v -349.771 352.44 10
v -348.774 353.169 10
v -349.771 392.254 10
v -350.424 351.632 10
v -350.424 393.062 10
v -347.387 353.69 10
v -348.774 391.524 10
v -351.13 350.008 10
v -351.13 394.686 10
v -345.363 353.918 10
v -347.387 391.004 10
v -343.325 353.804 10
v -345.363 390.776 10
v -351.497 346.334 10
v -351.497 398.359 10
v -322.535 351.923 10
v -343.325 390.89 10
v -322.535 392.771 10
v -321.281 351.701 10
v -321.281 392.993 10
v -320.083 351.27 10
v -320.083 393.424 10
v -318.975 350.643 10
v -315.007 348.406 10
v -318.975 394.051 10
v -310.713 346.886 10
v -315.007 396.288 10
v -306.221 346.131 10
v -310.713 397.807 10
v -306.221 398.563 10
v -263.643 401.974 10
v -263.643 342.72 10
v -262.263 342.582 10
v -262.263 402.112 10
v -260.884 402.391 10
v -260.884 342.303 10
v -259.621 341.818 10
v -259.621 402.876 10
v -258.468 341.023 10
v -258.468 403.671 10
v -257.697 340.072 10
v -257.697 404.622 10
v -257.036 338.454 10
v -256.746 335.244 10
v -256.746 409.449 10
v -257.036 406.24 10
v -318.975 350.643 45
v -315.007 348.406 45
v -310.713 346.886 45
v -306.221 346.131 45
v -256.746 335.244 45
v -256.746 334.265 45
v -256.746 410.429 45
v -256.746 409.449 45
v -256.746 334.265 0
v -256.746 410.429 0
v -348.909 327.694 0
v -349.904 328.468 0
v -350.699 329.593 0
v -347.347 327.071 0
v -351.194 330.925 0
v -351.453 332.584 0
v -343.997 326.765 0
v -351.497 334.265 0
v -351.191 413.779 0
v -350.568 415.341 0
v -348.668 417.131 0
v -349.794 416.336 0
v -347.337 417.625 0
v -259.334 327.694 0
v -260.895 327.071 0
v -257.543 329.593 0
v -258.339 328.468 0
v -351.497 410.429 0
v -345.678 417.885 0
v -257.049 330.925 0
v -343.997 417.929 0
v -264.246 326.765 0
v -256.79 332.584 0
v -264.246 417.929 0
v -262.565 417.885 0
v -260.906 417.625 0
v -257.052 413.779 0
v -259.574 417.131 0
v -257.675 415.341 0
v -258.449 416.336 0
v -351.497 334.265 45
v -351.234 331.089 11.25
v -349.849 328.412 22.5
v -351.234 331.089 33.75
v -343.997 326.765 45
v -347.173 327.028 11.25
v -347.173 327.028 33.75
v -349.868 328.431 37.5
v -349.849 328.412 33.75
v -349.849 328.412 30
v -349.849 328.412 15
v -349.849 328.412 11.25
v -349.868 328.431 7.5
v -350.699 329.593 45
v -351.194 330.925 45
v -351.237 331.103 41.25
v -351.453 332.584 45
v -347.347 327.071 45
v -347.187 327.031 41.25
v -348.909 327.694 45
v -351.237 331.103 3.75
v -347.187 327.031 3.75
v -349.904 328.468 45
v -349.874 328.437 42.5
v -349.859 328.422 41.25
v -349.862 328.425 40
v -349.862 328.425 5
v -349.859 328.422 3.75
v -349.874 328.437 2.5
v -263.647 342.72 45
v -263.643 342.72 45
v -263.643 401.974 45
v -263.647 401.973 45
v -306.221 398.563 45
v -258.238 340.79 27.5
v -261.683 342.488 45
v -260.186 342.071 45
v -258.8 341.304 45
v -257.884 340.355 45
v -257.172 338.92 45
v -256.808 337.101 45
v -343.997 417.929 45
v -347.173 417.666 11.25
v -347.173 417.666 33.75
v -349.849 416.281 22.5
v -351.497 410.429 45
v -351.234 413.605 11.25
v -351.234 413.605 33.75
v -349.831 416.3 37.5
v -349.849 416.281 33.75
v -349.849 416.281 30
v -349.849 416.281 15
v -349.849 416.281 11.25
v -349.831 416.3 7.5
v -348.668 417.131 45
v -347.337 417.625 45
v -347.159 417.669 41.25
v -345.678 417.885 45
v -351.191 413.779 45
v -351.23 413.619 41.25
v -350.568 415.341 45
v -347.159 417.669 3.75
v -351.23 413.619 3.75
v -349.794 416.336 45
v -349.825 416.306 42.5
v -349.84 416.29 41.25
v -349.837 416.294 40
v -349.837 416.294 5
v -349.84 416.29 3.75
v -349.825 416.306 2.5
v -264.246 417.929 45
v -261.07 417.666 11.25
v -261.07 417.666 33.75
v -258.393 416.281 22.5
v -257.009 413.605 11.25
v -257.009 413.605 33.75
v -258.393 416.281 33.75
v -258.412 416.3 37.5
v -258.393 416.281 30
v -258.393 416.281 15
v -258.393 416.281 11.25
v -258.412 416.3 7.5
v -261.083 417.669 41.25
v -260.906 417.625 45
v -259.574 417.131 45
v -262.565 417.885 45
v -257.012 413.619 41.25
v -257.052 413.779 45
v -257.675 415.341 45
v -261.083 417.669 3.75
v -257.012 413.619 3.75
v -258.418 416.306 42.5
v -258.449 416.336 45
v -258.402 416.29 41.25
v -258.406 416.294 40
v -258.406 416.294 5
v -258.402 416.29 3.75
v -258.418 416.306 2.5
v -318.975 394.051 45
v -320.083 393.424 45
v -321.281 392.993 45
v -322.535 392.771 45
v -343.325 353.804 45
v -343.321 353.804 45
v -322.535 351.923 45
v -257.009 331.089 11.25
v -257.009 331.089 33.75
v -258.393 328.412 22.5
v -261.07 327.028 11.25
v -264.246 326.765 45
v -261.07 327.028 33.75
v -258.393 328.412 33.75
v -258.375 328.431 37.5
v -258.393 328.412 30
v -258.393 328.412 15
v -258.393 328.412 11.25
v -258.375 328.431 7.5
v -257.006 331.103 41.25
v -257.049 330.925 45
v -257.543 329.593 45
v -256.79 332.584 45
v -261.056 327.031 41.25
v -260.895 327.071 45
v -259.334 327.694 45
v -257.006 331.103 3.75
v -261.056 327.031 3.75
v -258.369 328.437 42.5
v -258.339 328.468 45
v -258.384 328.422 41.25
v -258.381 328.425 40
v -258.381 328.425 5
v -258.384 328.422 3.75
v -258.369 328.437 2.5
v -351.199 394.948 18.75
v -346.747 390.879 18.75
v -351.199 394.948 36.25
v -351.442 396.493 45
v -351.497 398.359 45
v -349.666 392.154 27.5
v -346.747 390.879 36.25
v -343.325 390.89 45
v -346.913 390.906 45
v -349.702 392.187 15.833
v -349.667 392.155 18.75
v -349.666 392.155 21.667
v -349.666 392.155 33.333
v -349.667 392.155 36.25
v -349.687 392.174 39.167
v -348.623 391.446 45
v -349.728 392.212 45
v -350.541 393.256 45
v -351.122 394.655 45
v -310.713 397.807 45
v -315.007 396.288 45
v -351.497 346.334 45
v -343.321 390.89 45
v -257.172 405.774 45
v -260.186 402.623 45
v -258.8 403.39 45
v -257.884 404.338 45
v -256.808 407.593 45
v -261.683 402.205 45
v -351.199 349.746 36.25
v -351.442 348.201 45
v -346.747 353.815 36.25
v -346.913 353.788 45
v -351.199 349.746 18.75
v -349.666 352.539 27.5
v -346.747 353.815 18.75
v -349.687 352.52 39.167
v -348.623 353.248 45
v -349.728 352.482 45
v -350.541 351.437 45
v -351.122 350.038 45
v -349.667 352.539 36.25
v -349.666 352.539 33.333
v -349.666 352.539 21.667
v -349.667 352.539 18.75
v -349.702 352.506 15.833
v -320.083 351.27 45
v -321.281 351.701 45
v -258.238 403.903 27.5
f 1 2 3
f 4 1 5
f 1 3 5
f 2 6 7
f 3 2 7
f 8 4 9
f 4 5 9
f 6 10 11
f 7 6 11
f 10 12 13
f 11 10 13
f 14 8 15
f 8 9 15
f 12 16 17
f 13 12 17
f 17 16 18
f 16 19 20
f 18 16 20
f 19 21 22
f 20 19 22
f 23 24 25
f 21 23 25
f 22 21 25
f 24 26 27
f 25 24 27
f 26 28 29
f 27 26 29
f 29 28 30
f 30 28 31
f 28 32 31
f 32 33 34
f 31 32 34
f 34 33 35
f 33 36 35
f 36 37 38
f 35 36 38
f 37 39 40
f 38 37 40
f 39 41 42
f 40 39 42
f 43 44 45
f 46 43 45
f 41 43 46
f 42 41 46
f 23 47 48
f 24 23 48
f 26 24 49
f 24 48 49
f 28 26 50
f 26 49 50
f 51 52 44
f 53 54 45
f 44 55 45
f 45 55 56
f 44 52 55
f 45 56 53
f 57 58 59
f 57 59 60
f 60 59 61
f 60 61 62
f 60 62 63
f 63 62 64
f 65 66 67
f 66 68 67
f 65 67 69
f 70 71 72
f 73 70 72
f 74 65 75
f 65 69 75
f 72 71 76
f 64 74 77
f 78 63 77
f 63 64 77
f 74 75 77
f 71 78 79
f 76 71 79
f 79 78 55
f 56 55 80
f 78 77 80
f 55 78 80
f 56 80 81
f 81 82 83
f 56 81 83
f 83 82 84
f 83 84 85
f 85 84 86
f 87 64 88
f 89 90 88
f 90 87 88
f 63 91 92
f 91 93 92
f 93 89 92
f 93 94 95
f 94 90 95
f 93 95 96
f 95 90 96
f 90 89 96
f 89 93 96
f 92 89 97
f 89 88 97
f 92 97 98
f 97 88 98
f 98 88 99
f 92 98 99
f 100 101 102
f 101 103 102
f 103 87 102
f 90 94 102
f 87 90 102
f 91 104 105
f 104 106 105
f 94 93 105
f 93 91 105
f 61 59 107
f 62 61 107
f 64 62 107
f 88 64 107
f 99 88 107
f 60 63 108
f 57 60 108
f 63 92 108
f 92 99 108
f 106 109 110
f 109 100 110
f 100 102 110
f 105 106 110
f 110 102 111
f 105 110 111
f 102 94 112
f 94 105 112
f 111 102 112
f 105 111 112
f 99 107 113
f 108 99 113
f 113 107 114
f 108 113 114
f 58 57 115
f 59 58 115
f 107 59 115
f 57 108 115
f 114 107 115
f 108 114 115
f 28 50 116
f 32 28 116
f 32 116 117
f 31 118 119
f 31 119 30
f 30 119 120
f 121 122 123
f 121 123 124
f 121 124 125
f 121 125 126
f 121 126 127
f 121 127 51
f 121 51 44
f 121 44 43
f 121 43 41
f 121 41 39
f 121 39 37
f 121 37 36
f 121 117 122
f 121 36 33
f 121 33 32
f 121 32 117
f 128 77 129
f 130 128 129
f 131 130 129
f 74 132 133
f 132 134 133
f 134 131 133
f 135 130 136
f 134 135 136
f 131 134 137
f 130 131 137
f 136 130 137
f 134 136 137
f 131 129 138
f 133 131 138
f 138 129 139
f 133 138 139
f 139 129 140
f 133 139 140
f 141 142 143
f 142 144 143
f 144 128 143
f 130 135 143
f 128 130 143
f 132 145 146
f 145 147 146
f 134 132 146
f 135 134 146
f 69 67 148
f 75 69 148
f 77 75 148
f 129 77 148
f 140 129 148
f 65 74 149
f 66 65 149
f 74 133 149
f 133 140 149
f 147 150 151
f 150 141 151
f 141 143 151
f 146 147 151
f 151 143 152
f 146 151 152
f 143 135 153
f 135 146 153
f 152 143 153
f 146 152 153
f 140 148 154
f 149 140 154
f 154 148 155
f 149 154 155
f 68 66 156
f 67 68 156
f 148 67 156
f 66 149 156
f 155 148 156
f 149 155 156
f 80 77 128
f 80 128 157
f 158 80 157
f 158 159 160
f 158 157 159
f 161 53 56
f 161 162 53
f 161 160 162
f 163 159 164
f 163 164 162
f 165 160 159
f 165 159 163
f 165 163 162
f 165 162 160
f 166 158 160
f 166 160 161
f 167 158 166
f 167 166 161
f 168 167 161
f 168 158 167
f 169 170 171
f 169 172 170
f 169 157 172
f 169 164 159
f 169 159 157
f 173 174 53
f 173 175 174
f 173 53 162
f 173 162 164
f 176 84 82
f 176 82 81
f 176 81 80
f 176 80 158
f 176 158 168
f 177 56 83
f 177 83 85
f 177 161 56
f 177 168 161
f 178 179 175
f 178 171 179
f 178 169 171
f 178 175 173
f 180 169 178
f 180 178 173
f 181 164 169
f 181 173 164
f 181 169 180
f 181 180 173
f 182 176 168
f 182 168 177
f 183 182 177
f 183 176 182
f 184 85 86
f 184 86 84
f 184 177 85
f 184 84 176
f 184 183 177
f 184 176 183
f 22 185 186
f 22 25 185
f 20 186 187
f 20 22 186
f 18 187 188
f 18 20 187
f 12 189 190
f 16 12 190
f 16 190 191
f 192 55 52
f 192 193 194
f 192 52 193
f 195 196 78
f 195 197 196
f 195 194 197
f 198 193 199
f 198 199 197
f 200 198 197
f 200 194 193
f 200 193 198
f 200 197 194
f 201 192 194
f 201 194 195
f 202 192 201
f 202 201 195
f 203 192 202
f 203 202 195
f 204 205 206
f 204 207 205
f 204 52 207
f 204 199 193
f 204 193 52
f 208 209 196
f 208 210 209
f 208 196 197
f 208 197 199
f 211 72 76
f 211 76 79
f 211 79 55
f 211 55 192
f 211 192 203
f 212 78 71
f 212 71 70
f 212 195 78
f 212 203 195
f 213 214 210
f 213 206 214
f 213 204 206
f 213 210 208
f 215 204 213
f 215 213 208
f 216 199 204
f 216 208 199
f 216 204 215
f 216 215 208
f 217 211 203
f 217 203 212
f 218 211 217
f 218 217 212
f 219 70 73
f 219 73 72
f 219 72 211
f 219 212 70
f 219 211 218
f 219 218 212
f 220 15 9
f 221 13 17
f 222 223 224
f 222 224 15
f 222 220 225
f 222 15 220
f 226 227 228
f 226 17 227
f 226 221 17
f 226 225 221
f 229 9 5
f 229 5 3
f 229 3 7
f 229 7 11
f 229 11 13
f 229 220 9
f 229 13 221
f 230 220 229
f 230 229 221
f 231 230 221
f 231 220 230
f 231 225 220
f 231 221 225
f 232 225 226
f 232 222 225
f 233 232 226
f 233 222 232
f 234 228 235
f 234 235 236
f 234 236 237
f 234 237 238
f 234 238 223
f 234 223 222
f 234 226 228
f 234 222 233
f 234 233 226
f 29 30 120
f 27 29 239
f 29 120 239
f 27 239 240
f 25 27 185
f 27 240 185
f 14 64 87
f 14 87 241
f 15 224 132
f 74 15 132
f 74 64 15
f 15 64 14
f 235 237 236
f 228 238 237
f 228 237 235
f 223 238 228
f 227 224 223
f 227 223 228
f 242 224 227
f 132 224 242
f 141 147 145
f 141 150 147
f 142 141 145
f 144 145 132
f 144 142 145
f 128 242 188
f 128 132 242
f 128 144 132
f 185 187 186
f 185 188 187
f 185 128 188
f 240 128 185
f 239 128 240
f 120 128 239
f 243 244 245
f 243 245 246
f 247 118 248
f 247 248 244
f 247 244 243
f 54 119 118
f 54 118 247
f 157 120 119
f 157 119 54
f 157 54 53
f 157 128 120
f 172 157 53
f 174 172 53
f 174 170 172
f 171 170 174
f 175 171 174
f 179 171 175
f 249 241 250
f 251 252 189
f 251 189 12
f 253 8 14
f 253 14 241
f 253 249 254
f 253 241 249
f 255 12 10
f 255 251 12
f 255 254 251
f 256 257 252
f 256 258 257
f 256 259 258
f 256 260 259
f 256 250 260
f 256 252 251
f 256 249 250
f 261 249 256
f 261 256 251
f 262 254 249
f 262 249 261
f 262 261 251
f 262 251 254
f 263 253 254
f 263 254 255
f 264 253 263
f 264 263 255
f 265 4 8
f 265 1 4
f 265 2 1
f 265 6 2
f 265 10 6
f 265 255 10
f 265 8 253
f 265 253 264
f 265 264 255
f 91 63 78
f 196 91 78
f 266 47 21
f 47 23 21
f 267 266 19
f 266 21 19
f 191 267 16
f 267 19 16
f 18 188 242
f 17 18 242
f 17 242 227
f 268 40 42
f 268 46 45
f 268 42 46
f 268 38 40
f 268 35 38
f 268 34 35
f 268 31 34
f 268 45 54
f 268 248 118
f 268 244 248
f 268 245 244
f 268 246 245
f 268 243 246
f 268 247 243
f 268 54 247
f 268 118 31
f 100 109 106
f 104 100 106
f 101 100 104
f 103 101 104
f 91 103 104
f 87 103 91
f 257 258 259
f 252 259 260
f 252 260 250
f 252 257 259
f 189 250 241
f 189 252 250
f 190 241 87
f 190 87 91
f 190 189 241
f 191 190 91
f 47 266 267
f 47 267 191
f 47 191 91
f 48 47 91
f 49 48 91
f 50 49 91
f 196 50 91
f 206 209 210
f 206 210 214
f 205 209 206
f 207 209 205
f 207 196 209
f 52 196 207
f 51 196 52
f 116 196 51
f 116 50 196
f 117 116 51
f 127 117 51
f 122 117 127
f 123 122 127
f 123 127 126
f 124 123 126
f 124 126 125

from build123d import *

# Parameters (mm, degrees)
SKETCH2_W           = 94.751202958
SKETCH2_H           = 91.163886598
BOSS_EXTRUDE1_DEPTH = 45
CUT_EXTRUDE3_DEPTH  = 35
FILLET2_SIZE        = 7.5
FILLET3_R           = 7.5


with BuildPart() as part:
    # Sketch2 → Boss-Extrude1 (new body)
    with BuildSketch(Plane.XY):
        with Locations((-304.121373084, 372.346881372)):
            Rectangle(SKETCH2_W, SKETCH2_H)
    extrude(amount=BOSS_EXTRUDE1_DEPTH)

    # Sketch5 → Cut-Extrude3 (cut)
    with BuildSketch(Plane.XY.offset(45)):
        with BuildLine():
            Line((-371.329773575, 356.337977129), (-320.45664172, 351.735015891))
            ThreePointArc((-320.45664172, 351.735015891), (-313.755539426, 347.87500284), (-306.221453805, 346.130862205))
            Line((-306.221453805, 346.130862205), (-238.931197352, 340.740456843))
            Line((-238.931197352, 340.740456843), (-238.931197352, 403.953305901))
            Line((-238.931197352, 403.953305901), (-306.221453805, 398.562900539))
            ThreePointArc((-306.221453805, 398.562900539), (-313.755539426, 396.818759904), (-320.45664172, 392.958746853))
            Line((-320.45664172, 392.958746853), (-371.329773575, 388.355785615))
            Line((-371.329773575, 388.355785615), (-371.329773575, 356.337977129))
        make_face()
    extrude(amount=-CUT_EXTRUDE3_DEPTH, mode=Mode.SUBTRACT)

    # Fillet2
    # a fillet whose section is not a circle: 7.5 mm, written as the material it takes off along each edge
    with BuildSketch(Plane(origin=(-351.496974563, 326.764938073, -18.75), x_dir=(0, 1, 0), z_dir=(0, 0, 1)), Plane(origin=(-351.496974563, 417.928824671, -18.75), x_dir=(1, 0, 0), z_dir=(0, 0, 1))) as fillet2_piece_1:
        with BuildLine():
            add(Edge.make_bspline([(FILLET2_SIZE, 0), (6.238514613, 0), (4.977029227, 0), (2.196699141, -0.537689399), (0.537689399, -2.196699141), (0, -4.977029227), (0, -6.238514613), (0, -FILLET2_SIZE)], knots=[0, 0, 0, 0, 0, 0, 0.5, 0.5, 1, 1, 1, 1, 1, 1], degree=5))
            Line((0, -FILLET2_SIZE), (0, 0))
            Line((0, 0), (FILLET2_SIZE, 0))
        make_face()
    extrude(amount=82.5, mode=Mode.SUBTRACT)
    with BuildSketch(Plane(origin=(-351.496974563, 354.543520964, 10), x_dir=(0, -1, 0), z_dir=(0, 0, 1)), Plane(origin=(-351.496974563, 390.15024178, 65.523077256), x_dir=(0, 1, 0), z_dir=(0, 0, -1))) as fillet2_piece_2:
        with BuildLine():
            add(Edge.make_bspline([(8.209230902, 0), (6.849526251, 0), (5.4898216, 0), (2.507242029, 0.618786495), (0.842199494, 2.441282313), (0.494693995, 5.467487453), (0.617218509, 6.821660441), (0.739743023, 8.17583343)], knots=[0, 0, 0, 0, 0, 0, 0.5, 0.5, 1, 1, 1, 1, 1, 1], degree=5))
            Line((0.739743023, 8.17583343), (0, 0))
            Line((0, 0), (8.209230902, 0))
        make_face()
    extrude(amount=55.523077256, mode=Mode.SUBTRACT)
    with BuildSketch(Plane(origin=(-256.745771605, 417.928824671, -18.75), x_dir=(-1, 0, 0), z_dir=(0, 0, 1)), Plane(origin=(-256.745771605, 326.764938073, -18.75), x_dir=(0, 1, 0), z_dir=(0, 0, 1))) as fillet2_piece_3:
        with BuildLine():
            add(Edge.make_bspline([(FILLET2_SIZE, 0), (6.238514613, 0), (4.977029227, 0), (2.196699141, 0.537689399), (0.537689399, 2.196699141), (0, 4.977029227), (0, 6.238514613), (0, FILLET2_SIZE)], knots=[0, 0, 0, 0, 0, 0, 0.5, 0.5, 1, 1, 1, 1, 1, 1], degree=5))
            Line((0, FILLET2_SIZE), (0, 0))
            Line((0, 0), (FILLET2_SIZE, 0))
        make_face()
    extrude(amount=82.5, mode=Mode.SUBTRACT)
    with BuildSketch(Plane(origin=(-256.745771605, 342.167524916, 62.308062051), x_dir=(0, -1, 0), z_dir=(0, 0, -1)), Plane(origin=(-256.745771605, 402.526237828, 10), x_dir=(0, 1, 0), z_dir=(0, 0, 1))) as fillet2_piece_4:
        with BuildLine():
            add(Edge.make_bspline([(6.923224821, 0), (5.744187381, 0), (4.565149942, 0), (1.957575936, 0.472170808), (0.314348726, 1.989028329), (-0.364531688, 4.550572562), (-0.45867898, 5.725845114), (-0.552826273, 6.901117665)], knots=[0, 0, 0, 0, 0, 0, 0.5, 0.5, 1, 1, 1, 1, 1, 1], degree=5))
            Line((-0.552826273, 6.901117665), (0, 0))
            Line((0, 0), (6.923224821, 0))
        make_face()
    extrude(amount=52.308062051, mode=Mode.SUBTRACT)

    # Fillet3
    fillet3_edges = [part.edges().sort_by_distance(p)[0] for p in [
        (-320.45664172, 351.735015891, 27.5),
        (-320.45664172, 392.958746853, 27.5),
    ]]
    fillet(fillet3_edges, radius=FILLET3_R)


solid = part.part
